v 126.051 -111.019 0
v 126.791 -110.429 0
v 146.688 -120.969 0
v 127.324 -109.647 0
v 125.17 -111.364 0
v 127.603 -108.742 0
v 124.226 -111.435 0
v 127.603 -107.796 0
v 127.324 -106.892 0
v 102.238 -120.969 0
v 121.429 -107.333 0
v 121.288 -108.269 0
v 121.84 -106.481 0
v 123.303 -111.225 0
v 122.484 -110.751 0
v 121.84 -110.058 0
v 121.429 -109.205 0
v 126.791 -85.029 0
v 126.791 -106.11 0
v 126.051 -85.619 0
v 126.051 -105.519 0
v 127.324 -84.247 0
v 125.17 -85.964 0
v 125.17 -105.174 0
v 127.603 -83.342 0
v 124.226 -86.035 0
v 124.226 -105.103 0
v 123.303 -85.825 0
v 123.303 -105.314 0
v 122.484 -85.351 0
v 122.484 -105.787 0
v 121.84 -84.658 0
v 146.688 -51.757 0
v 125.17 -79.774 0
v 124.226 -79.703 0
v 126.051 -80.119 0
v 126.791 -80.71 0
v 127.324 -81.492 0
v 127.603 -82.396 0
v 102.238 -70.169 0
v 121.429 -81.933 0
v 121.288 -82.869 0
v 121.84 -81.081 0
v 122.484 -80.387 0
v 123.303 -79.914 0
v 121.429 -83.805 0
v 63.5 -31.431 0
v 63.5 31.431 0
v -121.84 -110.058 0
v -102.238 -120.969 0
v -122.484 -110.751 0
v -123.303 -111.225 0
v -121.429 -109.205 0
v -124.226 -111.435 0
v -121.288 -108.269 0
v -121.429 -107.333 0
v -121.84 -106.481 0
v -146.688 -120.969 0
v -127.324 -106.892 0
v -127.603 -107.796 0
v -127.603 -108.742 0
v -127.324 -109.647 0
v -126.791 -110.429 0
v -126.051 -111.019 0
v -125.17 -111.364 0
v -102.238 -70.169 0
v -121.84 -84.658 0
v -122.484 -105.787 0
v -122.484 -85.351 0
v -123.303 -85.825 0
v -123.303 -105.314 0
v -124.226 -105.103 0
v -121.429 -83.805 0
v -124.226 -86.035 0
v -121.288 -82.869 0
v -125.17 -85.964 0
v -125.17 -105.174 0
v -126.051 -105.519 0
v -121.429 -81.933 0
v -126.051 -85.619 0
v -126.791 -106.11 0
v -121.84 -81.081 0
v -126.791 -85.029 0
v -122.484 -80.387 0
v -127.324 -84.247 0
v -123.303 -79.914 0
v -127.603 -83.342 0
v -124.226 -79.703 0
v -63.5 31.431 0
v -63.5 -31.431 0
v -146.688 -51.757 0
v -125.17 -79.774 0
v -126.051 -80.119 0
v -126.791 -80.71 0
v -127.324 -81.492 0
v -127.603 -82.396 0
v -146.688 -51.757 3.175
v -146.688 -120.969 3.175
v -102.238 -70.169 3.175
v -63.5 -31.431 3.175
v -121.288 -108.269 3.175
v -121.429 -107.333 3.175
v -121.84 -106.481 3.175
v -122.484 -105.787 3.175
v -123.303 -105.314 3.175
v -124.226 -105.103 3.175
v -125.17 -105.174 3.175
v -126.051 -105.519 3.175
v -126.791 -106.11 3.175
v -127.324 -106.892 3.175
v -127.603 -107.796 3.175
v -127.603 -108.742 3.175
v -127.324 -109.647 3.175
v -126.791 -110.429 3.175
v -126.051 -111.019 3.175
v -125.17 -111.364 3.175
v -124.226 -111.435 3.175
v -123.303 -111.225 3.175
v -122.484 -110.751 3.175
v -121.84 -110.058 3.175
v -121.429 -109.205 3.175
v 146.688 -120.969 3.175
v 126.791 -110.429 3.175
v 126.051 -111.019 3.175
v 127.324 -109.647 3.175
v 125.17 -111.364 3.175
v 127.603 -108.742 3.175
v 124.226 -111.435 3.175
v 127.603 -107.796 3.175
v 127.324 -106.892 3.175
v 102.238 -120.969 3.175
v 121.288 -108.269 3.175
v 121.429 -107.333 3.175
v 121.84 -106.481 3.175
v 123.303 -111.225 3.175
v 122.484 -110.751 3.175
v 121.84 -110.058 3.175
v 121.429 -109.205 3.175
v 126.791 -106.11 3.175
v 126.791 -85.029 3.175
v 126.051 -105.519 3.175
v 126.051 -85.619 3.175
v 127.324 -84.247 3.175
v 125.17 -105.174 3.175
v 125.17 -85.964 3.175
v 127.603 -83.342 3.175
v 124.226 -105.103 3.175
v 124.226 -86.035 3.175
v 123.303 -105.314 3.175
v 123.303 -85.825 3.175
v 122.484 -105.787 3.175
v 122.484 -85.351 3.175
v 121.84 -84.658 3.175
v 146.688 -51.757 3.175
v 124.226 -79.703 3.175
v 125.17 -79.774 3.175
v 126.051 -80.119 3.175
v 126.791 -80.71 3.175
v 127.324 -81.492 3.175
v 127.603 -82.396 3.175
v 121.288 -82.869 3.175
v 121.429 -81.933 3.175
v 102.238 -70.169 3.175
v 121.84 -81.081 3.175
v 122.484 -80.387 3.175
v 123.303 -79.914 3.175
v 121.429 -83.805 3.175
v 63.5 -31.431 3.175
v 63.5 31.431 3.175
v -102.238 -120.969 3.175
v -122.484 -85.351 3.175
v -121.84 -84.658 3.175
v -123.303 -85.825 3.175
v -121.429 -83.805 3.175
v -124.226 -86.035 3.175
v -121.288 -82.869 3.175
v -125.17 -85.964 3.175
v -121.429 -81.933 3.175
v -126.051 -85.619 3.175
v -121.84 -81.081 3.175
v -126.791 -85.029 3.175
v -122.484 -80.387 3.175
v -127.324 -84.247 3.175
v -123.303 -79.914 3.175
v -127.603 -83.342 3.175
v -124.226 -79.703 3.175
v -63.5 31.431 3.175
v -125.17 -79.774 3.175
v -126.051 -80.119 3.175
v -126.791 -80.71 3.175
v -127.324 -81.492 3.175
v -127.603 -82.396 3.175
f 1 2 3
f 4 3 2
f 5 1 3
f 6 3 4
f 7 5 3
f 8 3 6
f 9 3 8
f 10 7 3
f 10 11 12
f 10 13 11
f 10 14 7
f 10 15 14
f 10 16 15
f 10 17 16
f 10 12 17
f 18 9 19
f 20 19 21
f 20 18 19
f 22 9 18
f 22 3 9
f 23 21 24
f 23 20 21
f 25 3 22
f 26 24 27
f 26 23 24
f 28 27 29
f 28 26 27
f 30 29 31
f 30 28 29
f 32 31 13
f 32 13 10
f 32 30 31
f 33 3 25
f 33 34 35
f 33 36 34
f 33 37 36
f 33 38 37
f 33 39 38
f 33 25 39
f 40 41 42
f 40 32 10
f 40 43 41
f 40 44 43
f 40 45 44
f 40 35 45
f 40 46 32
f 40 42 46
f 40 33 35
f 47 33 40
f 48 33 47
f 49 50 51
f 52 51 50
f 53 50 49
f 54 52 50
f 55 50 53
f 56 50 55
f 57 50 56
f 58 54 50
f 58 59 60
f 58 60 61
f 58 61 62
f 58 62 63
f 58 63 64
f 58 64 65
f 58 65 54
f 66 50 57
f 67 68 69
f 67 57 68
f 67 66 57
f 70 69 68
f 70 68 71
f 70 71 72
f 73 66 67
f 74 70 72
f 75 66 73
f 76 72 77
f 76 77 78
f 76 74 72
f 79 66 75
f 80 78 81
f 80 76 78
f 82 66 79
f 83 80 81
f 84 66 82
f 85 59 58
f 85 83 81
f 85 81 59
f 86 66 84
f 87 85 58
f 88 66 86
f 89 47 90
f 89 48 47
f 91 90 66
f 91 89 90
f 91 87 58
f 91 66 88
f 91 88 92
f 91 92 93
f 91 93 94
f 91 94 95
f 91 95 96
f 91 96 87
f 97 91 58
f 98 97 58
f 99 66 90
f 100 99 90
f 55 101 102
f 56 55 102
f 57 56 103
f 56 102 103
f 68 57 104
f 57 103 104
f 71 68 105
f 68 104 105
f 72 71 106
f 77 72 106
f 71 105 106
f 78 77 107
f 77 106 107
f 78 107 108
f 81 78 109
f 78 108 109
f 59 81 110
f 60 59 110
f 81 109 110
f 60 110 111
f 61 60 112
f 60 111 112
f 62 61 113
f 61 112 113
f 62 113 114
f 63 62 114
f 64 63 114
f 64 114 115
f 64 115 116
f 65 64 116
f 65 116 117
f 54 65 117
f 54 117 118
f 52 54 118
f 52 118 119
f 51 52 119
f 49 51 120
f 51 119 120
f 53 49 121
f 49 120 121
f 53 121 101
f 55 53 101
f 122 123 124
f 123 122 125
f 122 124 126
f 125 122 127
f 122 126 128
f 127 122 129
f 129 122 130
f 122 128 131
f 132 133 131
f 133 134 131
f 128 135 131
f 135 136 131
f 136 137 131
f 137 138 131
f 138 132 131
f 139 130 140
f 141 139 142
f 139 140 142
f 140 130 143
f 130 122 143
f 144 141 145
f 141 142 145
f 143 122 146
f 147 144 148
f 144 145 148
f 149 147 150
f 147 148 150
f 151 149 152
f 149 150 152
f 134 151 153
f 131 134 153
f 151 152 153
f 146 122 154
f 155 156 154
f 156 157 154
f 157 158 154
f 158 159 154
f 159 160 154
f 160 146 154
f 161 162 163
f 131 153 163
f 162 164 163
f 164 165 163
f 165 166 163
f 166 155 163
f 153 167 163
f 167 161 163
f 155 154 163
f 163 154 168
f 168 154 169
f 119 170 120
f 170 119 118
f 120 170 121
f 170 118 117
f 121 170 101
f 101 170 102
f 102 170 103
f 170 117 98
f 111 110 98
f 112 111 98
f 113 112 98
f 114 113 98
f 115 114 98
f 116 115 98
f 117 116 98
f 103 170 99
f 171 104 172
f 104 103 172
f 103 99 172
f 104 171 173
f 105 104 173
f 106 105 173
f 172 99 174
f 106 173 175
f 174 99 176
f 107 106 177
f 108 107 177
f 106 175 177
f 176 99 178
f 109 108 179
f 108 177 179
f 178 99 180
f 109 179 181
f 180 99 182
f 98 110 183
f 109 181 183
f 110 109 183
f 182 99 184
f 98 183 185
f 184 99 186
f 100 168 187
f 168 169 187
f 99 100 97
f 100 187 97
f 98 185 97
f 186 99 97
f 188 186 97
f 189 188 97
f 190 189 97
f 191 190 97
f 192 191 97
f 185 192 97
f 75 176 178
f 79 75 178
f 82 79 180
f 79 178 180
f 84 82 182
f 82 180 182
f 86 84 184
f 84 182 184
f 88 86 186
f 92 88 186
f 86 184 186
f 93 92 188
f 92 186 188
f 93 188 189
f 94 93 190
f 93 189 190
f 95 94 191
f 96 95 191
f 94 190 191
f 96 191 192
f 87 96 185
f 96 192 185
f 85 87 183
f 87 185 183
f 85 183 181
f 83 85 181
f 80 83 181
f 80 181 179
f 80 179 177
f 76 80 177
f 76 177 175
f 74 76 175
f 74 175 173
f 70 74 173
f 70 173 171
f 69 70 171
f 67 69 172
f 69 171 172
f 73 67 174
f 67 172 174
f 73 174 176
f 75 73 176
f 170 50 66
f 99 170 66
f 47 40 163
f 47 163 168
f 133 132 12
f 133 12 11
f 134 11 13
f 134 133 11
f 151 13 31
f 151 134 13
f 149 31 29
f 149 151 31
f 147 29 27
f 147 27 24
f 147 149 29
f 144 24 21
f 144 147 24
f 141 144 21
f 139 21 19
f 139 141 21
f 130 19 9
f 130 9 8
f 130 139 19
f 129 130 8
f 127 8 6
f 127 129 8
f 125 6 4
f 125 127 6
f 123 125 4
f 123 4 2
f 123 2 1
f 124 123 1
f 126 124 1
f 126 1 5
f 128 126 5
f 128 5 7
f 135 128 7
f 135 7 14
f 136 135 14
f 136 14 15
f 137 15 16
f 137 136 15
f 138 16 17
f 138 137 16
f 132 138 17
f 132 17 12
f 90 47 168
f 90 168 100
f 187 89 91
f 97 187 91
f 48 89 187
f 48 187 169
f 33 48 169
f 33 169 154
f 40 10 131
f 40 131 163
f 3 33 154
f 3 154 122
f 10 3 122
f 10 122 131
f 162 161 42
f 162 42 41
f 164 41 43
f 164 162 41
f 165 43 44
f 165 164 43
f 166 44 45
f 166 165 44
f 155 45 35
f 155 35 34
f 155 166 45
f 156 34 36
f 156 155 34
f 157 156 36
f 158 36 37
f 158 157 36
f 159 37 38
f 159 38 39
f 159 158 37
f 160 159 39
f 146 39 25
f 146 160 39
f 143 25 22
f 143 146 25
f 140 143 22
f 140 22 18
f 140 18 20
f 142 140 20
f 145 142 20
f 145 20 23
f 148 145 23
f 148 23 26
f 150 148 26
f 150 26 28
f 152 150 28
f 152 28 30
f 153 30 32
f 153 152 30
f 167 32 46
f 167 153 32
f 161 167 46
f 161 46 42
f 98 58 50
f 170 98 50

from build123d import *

# Parameters (mm, degrees)
BOSS_EXTRUDE1_DEPTH = 3.175
SKETCH4_R           = 3.175
CUT_EXTRUDE2_DEPTH  = 3.175


with BuildPart() as part:
    # Sketch1 → Boss-Extrude1 (new body)
    with BuildSketch(Plane.XY):
        Polygon((-63.5, 31.430896424), (-146.688207153, -51.757310729), (-146.688207153, -120.969103576), (-102.238207153, -120.969103576), (-102.238207153, -70.169103576), (-63.5, -31.430896424), (0, -31.430896424), (0, 31.430896424), align=None)
    boss_extrude1 = extrude(amount=BOSS_EXTRUDE1_DEPTH)

    # Sketch4 → Cut-Extrude2 (cut)
    with BuildSketch(Plane.XY.offset(3.175)):
        with Locations((-124.463207153, -108.269103576)):
            Circle(SKETCH4_R)
        with Locations((-124.463207153, -82.869103576)):
            Circle(SKETCH4_R)
    cut_extrude2 = extrude(amount=-CUT_EXTRUDE2_DEPTH, mode=Mode.SUBTRACT)

    # Mirror4: Boss-Extrude1, Cut-Extrude2 across plane
    add(boss_extrude1.mirror(Plane(origin=(0, 31.430896424, 3.175), x_dir=(0, 0, 1), z_dir=(-1, 0, 0))))
    add(cut_extrude2.mirror(Plane(origin=(0, 31.430896424, 3.175), x_dir=(0, 0, 1), z_dir=(-1, 0, 0))), mode=Mode.SUBTRACT)


solid = part.part
